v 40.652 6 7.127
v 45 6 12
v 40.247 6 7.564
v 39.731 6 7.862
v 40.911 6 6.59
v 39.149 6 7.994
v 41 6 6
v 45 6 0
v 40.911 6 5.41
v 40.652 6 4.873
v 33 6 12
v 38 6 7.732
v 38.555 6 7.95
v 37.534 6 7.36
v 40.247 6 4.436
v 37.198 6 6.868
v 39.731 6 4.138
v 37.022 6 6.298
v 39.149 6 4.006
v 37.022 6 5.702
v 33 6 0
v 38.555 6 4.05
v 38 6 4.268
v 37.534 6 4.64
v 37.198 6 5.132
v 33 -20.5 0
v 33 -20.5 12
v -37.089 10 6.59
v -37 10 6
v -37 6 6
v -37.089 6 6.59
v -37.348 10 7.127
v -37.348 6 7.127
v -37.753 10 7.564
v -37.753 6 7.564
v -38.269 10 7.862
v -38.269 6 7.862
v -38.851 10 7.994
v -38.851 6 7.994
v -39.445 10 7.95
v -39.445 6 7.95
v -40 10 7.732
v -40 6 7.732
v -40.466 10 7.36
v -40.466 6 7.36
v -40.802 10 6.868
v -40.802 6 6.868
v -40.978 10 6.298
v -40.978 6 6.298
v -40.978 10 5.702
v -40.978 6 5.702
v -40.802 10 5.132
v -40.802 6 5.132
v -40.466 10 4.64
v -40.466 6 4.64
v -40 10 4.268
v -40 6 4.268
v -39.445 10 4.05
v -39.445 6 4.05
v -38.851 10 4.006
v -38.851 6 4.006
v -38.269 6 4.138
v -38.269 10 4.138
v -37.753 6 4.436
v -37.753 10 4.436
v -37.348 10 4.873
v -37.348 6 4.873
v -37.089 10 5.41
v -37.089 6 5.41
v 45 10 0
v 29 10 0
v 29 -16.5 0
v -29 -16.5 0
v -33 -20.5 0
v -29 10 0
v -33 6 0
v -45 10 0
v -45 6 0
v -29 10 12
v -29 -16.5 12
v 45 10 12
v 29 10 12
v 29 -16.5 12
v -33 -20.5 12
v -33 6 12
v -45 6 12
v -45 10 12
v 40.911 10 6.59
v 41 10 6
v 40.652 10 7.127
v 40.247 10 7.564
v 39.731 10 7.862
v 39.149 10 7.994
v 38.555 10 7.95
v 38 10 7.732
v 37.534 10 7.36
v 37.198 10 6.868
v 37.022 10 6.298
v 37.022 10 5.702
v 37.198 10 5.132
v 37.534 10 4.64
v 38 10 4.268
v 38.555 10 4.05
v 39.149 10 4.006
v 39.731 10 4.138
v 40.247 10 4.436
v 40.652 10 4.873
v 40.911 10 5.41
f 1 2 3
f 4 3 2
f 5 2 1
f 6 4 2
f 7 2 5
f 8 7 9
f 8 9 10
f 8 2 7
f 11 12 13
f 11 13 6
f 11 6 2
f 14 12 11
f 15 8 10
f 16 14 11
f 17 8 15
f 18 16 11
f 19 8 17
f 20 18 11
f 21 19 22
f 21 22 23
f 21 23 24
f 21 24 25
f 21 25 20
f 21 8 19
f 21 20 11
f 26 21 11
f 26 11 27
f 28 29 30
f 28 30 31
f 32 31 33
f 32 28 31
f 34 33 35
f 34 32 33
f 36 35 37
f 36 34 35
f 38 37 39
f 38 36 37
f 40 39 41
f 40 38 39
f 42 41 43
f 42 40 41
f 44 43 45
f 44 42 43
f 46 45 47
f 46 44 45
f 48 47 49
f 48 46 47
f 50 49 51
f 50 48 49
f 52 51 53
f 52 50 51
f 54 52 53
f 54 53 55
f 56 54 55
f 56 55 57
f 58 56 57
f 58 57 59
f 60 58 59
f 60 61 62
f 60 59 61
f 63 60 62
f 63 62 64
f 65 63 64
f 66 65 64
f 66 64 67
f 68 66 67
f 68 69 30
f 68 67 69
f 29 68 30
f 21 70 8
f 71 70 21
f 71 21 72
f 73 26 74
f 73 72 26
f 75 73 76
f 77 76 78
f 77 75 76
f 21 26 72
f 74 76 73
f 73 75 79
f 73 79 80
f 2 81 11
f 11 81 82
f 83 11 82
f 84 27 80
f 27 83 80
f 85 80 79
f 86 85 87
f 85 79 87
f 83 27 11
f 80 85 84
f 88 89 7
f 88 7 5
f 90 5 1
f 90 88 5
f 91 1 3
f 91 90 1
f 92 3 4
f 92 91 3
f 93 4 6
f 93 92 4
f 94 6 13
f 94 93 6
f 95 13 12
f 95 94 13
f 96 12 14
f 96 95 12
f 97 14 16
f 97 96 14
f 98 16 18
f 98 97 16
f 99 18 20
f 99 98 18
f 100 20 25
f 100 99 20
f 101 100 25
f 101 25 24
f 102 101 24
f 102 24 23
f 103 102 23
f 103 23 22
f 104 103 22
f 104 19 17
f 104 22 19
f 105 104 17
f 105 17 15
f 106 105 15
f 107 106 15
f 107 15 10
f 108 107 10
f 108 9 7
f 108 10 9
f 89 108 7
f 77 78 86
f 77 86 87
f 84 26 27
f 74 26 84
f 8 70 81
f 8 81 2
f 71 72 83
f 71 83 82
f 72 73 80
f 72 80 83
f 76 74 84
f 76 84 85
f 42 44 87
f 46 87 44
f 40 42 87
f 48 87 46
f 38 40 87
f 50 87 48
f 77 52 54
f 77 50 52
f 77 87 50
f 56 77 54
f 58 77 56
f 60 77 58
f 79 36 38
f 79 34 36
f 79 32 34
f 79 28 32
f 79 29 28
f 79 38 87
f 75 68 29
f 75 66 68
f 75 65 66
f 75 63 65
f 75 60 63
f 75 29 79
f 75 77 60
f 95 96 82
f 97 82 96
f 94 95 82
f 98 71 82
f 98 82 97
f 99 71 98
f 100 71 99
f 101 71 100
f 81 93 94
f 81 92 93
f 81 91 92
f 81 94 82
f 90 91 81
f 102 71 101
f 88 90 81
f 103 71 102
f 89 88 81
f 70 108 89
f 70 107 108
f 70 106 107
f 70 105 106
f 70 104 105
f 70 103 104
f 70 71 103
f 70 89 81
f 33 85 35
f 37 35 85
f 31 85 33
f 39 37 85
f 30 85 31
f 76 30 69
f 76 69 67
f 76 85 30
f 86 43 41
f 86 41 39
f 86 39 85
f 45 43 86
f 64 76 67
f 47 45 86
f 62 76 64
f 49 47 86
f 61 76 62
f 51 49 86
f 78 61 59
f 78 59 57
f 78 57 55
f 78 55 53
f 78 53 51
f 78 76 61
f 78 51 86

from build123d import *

# Parameters (mm, degrees)
CYLINDER001_R     = 2
CYLINDER001_DEPTH = 10
CYLINDER_R        = 2
CYLINDER_DEPTH    = 10
EXTRUDE_DEPTH     = 12


with BuildPart() as cylinder001:
    # Cylinder001 → Cylinder001 (new body)
    with BuildSketch(Plane(origin=(39, 13, 6), x_dir=(1, 0, 0), z_dir=(0, -1, 0))):
        Circle(CYLINDER001_R)
    extrude(amount=CYLINDER001_DEPTH)


with BuildPart() as cylinder:
    # Cylinder → Cylinder (new body)
    with BuildSketch(Plane(origin=(-39, 13, 6), x_dir=(1, 0, 0), z_dir=(0, -1, 0))):
        Circle(CYLINDER_R)
    extrude(amount=CYLINDER_DEPTH)


with BuildPart() as cut001:
    # Sketch → Extrude (new body)
    with BuildSketch(Plane.XY):
        Polygon((-29, -16.5), (29, -16.5), (29, 10), (45, 10), (45, 6), (33, 6), (33, -20.5), (-33, -20.5), (-33, 6), (-45, 6), (-45, 10), (-29, 10), align=None)
    extrude(amount=EXTRUDE_DEPTH)

    # Cut: cut Cylinder
    add(cylinder.part, mode=Mode.SUBTRACT)

    # Cut001: cut Cylinder001
    add(cylinder001.part, mode=Mode.SUBTRACT)


solid = cut001.part
